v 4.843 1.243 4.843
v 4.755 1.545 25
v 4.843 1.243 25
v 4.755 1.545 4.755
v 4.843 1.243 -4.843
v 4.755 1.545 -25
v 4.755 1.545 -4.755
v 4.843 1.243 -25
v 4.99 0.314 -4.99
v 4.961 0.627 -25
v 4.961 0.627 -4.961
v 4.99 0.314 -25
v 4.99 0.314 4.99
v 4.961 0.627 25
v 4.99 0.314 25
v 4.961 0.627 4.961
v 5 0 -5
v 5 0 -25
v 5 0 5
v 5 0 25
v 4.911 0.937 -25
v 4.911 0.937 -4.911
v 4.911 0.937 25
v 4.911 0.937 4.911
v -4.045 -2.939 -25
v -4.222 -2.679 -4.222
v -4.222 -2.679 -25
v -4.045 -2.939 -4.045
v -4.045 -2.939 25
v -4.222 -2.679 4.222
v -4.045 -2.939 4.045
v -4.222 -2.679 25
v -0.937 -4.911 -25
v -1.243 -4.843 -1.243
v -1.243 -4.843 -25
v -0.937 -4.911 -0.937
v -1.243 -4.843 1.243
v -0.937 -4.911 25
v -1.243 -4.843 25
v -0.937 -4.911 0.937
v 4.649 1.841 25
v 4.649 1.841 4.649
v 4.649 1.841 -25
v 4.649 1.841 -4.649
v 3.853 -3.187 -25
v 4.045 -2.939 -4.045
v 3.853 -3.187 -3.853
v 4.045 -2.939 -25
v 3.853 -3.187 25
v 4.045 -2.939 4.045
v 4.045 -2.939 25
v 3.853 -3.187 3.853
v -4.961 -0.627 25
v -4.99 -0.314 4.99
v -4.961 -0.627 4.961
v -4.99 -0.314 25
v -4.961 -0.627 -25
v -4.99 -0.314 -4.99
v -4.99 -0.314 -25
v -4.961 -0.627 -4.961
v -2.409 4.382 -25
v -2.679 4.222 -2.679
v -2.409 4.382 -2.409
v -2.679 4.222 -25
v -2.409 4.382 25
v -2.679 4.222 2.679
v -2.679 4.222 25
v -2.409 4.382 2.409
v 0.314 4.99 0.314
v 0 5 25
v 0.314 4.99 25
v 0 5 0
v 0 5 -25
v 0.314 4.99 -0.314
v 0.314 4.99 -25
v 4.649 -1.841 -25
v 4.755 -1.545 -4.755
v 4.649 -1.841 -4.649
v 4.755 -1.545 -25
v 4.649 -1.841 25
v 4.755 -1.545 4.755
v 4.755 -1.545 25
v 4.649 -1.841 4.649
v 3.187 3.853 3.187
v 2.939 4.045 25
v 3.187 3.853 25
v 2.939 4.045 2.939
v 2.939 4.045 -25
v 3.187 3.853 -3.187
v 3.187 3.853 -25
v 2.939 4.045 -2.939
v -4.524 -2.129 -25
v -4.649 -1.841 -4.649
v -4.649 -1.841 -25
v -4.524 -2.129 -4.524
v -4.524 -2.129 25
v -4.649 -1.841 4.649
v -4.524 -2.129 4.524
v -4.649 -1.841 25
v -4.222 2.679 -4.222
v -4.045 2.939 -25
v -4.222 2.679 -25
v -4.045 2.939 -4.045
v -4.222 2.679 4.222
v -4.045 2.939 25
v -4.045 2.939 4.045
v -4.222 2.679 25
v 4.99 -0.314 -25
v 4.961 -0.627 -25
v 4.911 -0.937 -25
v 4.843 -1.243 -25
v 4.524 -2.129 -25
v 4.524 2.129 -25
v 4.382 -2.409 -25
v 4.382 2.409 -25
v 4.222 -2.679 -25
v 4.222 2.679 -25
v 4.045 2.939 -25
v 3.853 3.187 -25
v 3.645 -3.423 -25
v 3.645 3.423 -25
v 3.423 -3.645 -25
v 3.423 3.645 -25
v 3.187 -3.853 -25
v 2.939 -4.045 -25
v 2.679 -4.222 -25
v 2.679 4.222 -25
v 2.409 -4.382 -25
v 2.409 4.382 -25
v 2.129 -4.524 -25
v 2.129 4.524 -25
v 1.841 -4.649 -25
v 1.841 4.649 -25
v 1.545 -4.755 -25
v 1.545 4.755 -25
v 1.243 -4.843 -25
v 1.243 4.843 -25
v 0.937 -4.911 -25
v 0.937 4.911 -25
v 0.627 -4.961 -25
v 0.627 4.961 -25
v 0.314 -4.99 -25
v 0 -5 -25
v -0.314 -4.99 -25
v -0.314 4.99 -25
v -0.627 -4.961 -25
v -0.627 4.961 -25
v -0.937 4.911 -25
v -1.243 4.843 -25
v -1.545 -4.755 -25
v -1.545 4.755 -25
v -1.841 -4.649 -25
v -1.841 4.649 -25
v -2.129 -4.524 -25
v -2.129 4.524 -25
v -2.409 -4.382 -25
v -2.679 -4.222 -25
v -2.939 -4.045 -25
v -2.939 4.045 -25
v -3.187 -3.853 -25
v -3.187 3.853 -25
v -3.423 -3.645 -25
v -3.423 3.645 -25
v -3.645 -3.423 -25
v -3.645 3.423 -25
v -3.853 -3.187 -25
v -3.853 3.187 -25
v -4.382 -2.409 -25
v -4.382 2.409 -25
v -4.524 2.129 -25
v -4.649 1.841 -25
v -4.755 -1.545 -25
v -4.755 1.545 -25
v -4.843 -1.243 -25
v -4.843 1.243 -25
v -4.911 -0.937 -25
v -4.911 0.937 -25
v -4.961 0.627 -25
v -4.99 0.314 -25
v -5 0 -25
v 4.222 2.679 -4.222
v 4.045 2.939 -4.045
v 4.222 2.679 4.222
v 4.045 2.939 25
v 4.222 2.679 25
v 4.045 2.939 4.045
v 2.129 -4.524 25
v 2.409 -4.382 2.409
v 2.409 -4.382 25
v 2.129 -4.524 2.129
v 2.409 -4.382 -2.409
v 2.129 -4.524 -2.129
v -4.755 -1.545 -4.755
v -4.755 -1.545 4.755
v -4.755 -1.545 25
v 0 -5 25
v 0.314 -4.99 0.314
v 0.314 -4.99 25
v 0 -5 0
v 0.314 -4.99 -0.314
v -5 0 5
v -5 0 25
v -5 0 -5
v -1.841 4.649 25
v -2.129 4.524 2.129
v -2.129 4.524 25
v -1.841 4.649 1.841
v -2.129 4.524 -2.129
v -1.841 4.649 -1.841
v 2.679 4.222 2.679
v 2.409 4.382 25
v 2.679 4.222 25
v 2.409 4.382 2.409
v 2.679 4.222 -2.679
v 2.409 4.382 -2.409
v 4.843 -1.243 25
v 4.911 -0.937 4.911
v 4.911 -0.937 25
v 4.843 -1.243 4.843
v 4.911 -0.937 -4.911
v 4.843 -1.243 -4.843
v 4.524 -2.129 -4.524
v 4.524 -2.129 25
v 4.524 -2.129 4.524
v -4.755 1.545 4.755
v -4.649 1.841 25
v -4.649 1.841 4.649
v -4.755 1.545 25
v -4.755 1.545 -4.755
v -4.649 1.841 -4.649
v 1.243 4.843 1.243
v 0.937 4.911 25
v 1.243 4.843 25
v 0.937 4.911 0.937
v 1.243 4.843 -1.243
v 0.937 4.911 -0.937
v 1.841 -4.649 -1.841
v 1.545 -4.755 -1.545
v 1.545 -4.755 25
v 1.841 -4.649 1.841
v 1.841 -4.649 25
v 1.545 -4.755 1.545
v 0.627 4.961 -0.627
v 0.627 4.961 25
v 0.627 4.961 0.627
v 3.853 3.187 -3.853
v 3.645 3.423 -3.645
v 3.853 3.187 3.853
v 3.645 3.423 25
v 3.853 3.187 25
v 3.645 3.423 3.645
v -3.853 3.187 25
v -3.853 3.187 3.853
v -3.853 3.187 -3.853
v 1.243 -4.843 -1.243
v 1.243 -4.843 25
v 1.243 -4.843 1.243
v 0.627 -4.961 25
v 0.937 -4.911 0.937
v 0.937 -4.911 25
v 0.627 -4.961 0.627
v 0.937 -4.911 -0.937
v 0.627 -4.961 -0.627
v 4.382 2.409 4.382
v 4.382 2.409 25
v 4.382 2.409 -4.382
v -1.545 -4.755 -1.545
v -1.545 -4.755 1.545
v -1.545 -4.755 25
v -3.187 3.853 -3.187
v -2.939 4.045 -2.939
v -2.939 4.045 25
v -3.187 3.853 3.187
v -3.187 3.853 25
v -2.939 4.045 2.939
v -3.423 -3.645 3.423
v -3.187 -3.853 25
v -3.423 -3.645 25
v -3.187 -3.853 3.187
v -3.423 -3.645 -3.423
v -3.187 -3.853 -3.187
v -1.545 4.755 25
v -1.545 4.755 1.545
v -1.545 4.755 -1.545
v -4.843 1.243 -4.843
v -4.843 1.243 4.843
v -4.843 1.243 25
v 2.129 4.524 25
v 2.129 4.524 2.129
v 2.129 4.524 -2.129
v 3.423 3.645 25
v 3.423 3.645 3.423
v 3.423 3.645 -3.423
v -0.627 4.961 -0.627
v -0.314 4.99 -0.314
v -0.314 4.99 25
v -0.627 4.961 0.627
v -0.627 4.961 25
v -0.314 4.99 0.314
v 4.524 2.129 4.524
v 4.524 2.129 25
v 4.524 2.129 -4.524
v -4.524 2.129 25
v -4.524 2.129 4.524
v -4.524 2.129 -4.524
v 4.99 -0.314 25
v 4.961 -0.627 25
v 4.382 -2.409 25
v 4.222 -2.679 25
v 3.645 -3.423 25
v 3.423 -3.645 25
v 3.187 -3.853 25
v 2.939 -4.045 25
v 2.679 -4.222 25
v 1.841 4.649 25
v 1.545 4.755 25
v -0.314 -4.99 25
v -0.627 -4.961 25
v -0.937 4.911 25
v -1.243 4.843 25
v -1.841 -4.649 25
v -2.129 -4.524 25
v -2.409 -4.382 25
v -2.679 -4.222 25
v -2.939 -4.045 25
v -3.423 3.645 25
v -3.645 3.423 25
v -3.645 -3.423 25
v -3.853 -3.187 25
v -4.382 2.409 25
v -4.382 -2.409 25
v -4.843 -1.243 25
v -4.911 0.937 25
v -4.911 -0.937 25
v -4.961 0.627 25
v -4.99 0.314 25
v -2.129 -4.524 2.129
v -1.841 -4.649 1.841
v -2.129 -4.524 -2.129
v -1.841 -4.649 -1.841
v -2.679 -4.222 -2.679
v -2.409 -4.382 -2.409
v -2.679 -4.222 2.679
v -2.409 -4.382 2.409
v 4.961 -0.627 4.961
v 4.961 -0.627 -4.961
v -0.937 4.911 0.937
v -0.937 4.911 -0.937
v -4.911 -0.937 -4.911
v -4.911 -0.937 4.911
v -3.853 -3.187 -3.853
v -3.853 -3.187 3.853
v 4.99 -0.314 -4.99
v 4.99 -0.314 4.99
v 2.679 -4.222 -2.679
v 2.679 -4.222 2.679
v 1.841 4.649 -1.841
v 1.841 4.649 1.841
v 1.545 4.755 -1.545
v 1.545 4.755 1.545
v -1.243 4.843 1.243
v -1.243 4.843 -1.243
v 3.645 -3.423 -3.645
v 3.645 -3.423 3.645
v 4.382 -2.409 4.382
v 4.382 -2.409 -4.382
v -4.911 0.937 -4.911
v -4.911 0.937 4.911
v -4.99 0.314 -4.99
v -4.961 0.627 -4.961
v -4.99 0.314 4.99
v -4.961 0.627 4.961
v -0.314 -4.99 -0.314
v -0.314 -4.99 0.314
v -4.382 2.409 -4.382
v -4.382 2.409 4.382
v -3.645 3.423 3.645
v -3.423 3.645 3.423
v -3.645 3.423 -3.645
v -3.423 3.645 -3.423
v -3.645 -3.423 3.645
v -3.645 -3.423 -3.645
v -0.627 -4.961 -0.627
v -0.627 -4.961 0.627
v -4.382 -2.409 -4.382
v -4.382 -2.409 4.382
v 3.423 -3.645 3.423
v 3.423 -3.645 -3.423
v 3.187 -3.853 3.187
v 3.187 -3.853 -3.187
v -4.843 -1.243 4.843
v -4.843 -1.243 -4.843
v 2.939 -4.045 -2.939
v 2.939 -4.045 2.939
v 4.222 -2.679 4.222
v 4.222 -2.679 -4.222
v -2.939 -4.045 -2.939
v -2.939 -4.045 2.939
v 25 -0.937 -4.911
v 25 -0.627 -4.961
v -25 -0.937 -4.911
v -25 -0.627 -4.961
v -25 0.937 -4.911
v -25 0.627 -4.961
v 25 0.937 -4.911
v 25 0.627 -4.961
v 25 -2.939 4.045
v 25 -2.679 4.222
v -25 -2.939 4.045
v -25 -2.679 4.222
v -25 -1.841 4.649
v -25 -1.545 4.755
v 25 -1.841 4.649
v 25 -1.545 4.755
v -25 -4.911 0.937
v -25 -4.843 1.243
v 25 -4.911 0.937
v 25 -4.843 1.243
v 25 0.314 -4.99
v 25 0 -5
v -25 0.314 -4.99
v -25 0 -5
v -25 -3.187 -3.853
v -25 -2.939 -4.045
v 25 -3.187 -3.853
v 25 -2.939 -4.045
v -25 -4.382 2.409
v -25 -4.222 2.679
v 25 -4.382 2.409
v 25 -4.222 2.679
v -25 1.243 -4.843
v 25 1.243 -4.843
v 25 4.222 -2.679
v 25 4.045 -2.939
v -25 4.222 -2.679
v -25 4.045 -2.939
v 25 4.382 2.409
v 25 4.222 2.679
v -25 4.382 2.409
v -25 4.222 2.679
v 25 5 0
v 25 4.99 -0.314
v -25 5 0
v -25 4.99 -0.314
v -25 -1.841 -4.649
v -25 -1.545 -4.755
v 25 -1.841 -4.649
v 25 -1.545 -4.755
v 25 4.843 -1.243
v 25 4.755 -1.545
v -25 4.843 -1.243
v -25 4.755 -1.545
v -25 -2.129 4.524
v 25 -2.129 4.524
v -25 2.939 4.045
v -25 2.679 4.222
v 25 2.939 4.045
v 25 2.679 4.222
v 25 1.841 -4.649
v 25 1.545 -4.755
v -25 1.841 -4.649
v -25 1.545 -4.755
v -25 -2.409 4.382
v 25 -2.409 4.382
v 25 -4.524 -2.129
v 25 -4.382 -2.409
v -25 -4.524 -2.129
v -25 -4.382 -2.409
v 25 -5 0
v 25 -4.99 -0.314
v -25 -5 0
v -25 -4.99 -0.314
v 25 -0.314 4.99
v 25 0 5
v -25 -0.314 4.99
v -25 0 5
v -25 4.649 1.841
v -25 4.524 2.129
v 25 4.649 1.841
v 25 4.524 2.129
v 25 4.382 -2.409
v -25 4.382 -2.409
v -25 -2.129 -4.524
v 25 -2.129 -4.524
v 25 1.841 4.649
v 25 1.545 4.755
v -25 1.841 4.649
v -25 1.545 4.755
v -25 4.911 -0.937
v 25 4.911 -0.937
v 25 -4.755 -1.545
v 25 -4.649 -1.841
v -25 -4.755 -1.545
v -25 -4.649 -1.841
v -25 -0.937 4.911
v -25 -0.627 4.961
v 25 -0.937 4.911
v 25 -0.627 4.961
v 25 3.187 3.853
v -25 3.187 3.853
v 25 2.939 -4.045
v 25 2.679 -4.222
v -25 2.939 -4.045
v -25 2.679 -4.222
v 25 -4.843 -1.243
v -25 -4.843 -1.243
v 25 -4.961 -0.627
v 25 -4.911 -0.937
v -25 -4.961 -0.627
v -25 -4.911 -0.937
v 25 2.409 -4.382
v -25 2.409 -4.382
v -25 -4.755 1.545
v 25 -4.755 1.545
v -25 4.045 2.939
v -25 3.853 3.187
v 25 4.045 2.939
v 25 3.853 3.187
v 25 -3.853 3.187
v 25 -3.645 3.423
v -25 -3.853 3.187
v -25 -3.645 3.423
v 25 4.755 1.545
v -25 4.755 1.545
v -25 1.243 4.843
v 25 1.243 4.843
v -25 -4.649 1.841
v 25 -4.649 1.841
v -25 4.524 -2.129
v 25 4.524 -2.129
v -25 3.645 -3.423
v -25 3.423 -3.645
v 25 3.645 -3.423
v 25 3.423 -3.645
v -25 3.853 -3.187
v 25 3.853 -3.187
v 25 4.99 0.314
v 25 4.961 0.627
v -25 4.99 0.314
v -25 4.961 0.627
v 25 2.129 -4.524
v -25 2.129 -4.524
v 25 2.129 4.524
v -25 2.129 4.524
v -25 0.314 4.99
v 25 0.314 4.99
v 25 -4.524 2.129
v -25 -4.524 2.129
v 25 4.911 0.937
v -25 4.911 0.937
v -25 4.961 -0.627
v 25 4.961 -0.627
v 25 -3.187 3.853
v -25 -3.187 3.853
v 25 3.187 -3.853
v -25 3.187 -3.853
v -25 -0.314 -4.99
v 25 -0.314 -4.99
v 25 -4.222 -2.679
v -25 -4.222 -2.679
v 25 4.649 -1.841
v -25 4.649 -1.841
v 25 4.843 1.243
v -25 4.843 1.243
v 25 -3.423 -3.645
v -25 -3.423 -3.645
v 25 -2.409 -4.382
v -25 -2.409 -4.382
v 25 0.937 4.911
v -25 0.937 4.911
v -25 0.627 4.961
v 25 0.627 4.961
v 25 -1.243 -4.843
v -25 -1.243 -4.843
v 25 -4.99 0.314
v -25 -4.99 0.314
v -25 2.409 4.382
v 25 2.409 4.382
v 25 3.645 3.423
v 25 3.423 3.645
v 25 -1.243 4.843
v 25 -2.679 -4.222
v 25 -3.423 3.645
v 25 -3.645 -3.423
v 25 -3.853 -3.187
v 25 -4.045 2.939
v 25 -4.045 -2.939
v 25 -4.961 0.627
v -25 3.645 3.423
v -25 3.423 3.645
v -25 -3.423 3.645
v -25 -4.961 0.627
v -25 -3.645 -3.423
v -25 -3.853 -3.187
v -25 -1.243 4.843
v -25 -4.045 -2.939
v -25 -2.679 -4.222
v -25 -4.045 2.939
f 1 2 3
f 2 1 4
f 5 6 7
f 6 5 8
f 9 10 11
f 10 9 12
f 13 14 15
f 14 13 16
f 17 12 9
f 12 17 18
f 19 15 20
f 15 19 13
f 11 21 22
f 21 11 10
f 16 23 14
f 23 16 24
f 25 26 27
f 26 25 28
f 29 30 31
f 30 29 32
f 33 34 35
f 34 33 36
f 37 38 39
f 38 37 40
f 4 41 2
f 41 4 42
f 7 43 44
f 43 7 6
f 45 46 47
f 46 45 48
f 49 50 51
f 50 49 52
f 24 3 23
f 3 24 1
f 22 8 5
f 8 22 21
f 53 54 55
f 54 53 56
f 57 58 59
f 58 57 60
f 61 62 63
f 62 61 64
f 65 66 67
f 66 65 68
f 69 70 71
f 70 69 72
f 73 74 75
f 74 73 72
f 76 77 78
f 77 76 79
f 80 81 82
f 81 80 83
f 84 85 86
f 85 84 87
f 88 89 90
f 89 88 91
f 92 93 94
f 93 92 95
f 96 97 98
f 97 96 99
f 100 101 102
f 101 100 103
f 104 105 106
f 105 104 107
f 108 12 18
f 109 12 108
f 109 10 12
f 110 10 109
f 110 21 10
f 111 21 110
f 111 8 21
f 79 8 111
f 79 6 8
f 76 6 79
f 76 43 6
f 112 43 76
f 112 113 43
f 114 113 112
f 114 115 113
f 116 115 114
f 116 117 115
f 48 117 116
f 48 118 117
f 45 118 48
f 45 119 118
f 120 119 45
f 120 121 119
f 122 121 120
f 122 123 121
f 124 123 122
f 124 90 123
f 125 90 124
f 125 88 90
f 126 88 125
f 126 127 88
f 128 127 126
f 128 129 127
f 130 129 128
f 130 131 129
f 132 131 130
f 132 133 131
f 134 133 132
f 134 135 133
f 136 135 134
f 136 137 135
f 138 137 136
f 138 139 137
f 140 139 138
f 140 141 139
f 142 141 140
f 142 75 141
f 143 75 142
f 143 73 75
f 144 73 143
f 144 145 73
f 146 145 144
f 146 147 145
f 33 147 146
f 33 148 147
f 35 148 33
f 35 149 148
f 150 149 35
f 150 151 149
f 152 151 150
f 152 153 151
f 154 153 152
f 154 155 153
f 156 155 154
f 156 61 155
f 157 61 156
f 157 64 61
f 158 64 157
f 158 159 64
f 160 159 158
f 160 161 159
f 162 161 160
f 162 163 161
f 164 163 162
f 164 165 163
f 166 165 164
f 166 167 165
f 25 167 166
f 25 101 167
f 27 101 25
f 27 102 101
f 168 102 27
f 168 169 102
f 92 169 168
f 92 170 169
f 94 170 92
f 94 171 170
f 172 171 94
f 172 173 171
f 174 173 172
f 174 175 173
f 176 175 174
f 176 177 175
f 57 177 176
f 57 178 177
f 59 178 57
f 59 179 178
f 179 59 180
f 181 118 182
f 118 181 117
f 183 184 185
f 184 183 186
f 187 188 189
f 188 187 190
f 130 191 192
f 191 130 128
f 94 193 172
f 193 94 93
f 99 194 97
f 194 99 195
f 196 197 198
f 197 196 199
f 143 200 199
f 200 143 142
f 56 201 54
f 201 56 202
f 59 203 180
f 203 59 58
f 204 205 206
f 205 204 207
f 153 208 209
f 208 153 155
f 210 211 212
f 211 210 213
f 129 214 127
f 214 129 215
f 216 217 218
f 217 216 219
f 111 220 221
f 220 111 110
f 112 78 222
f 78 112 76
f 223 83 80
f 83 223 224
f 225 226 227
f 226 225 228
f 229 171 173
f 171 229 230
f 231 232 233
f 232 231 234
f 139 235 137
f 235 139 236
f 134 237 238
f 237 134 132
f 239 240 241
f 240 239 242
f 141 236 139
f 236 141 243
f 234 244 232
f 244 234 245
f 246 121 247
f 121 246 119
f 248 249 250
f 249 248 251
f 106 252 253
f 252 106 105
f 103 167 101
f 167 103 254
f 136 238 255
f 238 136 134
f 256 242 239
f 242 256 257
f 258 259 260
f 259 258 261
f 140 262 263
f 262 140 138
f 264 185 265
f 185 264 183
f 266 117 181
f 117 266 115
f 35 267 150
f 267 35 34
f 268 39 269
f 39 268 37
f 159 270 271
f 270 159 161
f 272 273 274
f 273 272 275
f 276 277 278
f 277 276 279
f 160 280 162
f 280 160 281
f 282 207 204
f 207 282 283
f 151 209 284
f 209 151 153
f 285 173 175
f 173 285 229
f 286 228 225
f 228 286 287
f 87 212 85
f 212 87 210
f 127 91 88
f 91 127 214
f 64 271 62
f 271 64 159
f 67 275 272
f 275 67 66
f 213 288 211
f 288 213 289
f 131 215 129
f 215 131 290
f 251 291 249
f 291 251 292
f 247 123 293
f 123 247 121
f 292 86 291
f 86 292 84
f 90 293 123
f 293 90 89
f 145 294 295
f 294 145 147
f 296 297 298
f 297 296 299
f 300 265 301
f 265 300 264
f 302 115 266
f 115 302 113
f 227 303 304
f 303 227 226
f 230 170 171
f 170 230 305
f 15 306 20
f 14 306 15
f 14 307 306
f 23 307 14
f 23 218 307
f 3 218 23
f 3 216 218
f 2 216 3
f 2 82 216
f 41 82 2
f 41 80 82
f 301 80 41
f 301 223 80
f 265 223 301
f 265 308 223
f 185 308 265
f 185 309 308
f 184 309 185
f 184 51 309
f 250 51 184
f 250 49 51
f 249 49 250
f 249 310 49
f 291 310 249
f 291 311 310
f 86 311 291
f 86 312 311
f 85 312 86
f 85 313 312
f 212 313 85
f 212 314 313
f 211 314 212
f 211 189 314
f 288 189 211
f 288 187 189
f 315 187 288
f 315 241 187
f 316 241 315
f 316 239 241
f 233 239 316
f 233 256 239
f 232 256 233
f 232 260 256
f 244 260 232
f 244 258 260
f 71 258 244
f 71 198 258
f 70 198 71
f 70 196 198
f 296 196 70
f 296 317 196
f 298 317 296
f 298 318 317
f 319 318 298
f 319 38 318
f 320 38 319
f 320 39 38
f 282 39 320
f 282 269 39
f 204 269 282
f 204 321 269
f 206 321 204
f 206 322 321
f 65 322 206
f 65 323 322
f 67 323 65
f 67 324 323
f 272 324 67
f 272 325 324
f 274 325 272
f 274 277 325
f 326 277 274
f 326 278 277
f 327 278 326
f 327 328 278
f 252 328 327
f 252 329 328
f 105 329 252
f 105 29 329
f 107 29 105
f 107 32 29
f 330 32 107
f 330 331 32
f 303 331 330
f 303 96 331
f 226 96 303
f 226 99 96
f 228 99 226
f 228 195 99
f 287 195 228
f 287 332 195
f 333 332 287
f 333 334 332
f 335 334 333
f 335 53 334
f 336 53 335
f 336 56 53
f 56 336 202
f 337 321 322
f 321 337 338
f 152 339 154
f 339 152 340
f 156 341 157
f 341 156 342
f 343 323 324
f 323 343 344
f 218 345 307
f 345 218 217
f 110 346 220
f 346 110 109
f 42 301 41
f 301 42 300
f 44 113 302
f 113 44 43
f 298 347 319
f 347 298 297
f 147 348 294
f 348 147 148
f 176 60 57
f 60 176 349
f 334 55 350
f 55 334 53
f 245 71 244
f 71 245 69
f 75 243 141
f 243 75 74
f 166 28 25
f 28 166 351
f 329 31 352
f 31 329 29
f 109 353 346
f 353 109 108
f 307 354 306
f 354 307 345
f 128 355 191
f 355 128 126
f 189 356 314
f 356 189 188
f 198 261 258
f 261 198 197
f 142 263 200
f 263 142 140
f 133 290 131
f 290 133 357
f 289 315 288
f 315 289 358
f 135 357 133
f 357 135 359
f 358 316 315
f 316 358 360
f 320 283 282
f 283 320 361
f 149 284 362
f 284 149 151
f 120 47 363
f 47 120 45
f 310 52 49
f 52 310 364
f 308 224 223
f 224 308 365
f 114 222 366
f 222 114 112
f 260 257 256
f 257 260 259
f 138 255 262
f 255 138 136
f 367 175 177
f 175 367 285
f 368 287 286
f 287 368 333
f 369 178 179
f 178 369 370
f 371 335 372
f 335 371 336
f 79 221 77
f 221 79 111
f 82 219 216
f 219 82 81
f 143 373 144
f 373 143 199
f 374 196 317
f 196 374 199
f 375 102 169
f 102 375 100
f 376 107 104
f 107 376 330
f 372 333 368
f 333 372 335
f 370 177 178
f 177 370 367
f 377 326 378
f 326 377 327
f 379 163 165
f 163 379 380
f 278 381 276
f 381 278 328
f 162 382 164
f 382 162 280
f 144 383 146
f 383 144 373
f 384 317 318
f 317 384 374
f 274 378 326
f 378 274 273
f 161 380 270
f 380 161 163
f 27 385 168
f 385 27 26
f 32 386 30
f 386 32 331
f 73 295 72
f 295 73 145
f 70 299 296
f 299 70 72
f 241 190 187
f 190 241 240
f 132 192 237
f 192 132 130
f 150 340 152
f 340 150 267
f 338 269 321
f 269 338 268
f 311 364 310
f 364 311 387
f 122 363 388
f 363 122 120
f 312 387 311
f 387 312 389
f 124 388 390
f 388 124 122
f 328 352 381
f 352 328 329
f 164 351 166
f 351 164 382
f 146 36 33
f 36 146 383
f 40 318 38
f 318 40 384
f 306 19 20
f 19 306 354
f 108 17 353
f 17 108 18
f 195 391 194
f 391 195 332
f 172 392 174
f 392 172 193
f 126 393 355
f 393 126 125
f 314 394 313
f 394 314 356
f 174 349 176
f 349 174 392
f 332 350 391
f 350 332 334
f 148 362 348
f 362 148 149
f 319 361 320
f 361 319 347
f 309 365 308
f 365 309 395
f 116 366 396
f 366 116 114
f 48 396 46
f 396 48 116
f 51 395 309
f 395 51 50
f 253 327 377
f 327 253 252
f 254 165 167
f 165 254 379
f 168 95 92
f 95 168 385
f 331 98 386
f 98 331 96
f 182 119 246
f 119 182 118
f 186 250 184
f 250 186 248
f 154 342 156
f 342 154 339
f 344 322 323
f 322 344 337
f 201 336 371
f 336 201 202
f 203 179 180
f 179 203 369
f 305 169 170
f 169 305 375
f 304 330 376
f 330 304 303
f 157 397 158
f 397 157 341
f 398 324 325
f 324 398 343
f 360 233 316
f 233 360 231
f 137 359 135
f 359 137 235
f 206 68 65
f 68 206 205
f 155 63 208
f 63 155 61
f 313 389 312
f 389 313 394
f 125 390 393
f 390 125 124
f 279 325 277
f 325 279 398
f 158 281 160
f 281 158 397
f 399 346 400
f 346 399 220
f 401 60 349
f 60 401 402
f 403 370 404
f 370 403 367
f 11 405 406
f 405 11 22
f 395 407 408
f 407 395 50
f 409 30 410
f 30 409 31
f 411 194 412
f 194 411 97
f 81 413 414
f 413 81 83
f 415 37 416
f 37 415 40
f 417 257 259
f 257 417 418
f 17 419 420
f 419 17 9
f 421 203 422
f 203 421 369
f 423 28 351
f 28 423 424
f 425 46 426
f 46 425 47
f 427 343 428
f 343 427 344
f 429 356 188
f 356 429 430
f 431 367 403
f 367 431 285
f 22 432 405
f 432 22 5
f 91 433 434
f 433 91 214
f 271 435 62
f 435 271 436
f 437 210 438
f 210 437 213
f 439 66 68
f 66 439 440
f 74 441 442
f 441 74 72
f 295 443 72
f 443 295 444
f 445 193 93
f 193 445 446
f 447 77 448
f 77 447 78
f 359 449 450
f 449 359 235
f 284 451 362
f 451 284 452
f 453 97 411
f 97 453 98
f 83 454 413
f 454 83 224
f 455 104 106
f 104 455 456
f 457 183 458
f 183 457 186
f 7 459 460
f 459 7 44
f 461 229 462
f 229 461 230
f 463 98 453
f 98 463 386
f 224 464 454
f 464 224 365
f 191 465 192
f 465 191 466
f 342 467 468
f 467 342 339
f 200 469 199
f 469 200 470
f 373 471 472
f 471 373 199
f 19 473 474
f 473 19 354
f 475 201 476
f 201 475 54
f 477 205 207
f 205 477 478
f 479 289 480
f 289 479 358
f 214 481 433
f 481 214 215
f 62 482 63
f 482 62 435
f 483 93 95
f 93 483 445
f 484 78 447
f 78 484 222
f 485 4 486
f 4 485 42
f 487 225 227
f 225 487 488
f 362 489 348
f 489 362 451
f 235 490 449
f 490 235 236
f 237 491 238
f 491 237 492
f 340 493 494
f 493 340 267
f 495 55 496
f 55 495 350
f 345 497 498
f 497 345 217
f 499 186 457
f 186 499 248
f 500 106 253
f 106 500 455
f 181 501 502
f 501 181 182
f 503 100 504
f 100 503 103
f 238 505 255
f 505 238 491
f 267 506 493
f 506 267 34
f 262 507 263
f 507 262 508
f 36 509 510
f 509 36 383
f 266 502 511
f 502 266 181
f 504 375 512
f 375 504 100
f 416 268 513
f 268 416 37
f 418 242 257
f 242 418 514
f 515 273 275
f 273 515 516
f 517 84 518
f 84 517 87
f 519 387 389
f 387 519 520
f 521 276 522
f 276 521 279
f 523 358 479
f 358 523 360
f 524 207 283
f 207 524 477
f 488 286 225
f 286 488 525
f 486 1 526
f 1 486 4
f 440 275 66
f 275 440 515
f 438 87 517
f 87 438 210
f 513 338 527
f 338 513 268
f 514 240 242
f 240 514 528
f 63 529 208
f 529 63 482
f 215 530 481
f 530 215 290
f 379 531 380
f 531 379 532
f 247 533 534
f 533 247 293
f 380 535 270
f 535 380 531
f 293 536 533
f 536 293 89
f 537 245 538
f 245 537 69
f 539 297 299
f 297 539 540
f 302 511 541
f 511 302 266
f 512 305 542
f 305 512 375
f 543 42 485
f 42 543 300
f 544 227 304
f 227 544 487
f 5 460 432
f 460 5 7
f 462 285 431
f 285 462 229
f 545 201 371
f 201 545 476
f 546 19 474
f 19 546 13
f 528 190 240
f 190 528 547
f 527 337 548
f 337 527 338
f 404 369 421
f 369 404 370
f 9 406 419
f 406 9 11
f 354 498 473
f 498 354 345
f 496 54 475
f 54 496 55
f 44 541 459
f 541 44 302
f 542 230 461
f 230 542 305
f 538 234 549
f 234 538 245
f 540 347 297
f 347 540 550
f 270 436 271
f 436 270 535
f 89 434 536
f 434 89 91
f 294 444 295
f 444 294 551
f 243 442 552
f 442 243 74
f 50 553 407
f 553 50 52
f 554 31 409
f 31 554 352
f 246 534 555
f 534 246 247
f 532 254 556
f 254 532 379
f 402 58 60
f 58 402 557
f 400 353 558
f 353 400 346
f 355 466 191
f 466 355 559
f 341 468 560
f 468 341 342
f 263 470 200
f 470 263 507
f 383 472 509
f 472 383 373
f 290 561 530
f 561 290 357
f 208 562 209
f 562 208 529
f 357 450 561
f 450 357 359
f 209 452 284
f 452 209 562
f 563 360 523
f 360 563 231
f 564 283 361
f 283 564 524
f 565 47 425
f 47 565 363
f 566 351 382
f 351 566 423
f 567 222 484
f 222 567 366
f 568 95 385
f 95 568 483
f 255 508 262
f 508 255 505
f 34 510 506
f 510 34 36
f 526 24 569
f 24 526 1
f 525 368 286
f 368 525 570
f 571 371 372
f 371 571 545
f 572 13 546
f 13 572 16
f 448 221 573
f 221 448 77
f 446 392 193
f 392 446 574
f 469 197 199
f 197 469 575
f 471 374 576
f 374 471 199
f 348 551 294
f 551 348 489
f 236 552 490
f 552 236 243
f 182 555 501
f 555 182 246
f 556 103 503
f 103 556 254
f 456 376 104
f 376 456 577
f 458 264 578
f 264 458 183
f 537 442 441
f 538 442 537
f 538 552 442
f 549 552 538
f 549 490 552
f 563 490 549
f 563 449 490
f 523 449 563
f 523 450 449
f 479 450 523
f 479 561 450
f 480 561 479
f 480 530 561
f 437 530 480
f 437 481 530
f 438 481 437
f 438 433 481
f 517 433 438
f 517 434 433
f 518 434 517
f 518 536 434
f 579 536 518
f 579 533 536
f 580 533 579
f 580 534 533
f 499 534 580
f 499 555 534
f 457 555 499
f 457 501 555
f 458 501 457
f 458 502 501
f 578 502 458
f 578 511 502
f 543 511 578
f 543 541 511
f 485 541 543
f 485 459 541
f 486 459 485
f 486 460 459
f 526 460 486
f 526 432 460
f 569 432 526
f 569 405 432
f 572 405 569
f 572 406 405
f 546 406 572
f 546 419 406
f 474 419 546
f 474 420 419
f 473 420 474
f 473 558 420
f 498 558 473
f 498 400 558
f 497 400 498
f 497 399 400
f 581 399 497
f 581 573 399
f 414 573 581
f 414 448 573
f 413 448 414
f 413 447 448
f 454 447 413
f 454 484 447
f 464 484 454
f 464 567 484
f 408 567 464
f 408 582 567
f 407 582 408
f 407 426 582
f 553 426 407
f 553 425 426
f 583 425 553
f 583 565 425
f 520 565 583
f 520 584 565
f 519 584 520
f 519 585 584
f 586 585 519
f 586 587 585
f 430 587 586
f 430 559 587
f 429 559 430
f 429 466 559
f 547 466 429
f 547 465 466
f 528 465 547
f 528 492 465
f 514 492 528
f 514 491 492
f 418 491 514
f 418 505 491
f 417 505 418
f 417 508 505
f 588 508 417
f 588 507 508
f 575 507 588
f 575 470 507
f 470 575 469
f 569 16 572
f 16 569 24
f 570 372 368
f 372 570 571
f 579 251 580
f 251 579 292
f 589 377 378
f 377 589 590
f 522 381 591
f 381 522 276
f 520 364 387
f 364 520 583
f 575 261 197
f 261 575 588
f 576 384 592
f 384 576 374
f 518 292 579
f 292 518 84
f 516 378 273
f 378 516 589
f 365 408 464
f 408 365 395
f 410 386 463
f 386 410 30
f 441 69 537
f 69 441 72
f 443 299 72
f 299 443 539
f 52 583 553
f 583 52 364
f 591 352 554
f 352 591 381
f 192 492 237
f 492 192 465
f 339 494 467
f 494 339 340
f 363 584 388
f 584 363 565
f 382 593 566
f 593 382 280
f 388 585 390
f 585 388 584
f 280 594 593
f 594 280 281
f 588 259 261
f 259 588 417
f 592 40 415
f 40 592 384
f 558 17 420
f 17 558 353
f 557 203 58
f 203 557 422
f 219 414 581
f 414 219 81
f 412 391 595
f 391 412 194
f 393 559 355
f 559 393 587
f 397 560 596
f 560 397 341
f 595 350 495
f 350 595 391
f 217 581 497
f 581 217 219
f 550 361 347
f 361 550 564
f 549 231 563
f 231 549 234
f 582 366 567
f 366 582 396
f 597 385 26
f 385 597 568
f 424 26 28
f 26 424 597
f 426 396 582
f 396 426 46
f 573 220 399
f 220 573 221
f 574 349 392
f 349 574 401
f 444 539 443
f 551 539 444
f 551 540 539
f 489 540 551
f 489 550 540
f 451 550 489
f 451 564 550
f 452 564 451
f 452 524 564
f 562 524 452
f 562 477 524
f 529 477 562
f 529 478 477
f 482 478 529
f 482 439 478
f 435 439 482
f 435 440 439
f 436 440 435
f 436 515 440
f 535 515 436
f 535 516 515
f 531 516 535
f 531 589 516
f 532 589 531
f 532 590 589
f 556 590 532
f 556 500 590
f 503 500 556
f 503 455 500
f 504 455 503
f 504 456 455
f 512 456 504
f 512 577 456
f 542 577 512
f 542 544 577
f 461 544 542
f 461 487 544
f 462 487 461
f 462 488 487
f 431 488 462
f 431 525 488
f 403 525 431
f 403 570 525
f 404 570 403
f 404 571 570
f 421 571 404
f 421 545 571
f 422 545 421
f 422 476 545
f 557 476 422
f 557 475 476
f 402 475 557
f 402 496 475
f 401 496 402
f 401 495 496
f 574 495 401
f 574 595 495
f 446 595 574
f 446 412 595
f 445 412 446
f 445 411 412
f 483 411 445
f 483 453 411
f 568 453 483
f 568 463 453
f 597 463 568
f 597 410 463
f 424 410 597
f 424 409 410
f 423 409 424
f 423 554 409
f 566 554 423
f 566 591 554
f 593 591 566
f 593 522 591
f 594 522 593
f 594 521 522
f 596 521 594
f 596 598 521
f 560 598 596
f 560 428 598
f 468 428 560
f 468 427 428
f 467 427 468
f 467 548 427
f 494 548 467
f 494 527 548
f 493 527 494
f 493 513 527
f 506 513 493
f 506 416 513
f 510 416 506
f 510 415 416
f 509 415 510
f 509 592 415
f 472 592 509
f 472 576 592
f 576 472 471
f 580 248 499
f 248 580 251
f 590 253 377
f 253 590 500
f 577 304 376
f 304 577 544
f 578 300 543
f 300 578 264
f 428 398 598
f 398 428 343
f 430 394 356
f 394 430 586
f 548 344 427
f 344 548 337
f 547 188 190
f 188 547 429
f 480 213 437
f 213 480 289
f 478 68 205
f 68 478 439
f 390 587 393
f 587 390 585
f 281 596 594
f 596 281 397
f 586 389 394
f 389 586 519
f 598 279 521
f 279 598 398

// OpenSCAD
/* 
	Supplemental T-Junction 1

*/

$fn = 100;  // Increase the resolution of the cylinders
pipe_radius = 5;
pipe_length = 50;

// Pipe along the x-axis
translate([0, 0, 0])
cylinder(h=pipe_length, r=pipe_radius, center=true);

// Pipe along the y-axis
rotate([0, 90, 0])
translate([0, 0, 0])
cylinder(h=pipe_length, r=pipe_radius, center=true);
